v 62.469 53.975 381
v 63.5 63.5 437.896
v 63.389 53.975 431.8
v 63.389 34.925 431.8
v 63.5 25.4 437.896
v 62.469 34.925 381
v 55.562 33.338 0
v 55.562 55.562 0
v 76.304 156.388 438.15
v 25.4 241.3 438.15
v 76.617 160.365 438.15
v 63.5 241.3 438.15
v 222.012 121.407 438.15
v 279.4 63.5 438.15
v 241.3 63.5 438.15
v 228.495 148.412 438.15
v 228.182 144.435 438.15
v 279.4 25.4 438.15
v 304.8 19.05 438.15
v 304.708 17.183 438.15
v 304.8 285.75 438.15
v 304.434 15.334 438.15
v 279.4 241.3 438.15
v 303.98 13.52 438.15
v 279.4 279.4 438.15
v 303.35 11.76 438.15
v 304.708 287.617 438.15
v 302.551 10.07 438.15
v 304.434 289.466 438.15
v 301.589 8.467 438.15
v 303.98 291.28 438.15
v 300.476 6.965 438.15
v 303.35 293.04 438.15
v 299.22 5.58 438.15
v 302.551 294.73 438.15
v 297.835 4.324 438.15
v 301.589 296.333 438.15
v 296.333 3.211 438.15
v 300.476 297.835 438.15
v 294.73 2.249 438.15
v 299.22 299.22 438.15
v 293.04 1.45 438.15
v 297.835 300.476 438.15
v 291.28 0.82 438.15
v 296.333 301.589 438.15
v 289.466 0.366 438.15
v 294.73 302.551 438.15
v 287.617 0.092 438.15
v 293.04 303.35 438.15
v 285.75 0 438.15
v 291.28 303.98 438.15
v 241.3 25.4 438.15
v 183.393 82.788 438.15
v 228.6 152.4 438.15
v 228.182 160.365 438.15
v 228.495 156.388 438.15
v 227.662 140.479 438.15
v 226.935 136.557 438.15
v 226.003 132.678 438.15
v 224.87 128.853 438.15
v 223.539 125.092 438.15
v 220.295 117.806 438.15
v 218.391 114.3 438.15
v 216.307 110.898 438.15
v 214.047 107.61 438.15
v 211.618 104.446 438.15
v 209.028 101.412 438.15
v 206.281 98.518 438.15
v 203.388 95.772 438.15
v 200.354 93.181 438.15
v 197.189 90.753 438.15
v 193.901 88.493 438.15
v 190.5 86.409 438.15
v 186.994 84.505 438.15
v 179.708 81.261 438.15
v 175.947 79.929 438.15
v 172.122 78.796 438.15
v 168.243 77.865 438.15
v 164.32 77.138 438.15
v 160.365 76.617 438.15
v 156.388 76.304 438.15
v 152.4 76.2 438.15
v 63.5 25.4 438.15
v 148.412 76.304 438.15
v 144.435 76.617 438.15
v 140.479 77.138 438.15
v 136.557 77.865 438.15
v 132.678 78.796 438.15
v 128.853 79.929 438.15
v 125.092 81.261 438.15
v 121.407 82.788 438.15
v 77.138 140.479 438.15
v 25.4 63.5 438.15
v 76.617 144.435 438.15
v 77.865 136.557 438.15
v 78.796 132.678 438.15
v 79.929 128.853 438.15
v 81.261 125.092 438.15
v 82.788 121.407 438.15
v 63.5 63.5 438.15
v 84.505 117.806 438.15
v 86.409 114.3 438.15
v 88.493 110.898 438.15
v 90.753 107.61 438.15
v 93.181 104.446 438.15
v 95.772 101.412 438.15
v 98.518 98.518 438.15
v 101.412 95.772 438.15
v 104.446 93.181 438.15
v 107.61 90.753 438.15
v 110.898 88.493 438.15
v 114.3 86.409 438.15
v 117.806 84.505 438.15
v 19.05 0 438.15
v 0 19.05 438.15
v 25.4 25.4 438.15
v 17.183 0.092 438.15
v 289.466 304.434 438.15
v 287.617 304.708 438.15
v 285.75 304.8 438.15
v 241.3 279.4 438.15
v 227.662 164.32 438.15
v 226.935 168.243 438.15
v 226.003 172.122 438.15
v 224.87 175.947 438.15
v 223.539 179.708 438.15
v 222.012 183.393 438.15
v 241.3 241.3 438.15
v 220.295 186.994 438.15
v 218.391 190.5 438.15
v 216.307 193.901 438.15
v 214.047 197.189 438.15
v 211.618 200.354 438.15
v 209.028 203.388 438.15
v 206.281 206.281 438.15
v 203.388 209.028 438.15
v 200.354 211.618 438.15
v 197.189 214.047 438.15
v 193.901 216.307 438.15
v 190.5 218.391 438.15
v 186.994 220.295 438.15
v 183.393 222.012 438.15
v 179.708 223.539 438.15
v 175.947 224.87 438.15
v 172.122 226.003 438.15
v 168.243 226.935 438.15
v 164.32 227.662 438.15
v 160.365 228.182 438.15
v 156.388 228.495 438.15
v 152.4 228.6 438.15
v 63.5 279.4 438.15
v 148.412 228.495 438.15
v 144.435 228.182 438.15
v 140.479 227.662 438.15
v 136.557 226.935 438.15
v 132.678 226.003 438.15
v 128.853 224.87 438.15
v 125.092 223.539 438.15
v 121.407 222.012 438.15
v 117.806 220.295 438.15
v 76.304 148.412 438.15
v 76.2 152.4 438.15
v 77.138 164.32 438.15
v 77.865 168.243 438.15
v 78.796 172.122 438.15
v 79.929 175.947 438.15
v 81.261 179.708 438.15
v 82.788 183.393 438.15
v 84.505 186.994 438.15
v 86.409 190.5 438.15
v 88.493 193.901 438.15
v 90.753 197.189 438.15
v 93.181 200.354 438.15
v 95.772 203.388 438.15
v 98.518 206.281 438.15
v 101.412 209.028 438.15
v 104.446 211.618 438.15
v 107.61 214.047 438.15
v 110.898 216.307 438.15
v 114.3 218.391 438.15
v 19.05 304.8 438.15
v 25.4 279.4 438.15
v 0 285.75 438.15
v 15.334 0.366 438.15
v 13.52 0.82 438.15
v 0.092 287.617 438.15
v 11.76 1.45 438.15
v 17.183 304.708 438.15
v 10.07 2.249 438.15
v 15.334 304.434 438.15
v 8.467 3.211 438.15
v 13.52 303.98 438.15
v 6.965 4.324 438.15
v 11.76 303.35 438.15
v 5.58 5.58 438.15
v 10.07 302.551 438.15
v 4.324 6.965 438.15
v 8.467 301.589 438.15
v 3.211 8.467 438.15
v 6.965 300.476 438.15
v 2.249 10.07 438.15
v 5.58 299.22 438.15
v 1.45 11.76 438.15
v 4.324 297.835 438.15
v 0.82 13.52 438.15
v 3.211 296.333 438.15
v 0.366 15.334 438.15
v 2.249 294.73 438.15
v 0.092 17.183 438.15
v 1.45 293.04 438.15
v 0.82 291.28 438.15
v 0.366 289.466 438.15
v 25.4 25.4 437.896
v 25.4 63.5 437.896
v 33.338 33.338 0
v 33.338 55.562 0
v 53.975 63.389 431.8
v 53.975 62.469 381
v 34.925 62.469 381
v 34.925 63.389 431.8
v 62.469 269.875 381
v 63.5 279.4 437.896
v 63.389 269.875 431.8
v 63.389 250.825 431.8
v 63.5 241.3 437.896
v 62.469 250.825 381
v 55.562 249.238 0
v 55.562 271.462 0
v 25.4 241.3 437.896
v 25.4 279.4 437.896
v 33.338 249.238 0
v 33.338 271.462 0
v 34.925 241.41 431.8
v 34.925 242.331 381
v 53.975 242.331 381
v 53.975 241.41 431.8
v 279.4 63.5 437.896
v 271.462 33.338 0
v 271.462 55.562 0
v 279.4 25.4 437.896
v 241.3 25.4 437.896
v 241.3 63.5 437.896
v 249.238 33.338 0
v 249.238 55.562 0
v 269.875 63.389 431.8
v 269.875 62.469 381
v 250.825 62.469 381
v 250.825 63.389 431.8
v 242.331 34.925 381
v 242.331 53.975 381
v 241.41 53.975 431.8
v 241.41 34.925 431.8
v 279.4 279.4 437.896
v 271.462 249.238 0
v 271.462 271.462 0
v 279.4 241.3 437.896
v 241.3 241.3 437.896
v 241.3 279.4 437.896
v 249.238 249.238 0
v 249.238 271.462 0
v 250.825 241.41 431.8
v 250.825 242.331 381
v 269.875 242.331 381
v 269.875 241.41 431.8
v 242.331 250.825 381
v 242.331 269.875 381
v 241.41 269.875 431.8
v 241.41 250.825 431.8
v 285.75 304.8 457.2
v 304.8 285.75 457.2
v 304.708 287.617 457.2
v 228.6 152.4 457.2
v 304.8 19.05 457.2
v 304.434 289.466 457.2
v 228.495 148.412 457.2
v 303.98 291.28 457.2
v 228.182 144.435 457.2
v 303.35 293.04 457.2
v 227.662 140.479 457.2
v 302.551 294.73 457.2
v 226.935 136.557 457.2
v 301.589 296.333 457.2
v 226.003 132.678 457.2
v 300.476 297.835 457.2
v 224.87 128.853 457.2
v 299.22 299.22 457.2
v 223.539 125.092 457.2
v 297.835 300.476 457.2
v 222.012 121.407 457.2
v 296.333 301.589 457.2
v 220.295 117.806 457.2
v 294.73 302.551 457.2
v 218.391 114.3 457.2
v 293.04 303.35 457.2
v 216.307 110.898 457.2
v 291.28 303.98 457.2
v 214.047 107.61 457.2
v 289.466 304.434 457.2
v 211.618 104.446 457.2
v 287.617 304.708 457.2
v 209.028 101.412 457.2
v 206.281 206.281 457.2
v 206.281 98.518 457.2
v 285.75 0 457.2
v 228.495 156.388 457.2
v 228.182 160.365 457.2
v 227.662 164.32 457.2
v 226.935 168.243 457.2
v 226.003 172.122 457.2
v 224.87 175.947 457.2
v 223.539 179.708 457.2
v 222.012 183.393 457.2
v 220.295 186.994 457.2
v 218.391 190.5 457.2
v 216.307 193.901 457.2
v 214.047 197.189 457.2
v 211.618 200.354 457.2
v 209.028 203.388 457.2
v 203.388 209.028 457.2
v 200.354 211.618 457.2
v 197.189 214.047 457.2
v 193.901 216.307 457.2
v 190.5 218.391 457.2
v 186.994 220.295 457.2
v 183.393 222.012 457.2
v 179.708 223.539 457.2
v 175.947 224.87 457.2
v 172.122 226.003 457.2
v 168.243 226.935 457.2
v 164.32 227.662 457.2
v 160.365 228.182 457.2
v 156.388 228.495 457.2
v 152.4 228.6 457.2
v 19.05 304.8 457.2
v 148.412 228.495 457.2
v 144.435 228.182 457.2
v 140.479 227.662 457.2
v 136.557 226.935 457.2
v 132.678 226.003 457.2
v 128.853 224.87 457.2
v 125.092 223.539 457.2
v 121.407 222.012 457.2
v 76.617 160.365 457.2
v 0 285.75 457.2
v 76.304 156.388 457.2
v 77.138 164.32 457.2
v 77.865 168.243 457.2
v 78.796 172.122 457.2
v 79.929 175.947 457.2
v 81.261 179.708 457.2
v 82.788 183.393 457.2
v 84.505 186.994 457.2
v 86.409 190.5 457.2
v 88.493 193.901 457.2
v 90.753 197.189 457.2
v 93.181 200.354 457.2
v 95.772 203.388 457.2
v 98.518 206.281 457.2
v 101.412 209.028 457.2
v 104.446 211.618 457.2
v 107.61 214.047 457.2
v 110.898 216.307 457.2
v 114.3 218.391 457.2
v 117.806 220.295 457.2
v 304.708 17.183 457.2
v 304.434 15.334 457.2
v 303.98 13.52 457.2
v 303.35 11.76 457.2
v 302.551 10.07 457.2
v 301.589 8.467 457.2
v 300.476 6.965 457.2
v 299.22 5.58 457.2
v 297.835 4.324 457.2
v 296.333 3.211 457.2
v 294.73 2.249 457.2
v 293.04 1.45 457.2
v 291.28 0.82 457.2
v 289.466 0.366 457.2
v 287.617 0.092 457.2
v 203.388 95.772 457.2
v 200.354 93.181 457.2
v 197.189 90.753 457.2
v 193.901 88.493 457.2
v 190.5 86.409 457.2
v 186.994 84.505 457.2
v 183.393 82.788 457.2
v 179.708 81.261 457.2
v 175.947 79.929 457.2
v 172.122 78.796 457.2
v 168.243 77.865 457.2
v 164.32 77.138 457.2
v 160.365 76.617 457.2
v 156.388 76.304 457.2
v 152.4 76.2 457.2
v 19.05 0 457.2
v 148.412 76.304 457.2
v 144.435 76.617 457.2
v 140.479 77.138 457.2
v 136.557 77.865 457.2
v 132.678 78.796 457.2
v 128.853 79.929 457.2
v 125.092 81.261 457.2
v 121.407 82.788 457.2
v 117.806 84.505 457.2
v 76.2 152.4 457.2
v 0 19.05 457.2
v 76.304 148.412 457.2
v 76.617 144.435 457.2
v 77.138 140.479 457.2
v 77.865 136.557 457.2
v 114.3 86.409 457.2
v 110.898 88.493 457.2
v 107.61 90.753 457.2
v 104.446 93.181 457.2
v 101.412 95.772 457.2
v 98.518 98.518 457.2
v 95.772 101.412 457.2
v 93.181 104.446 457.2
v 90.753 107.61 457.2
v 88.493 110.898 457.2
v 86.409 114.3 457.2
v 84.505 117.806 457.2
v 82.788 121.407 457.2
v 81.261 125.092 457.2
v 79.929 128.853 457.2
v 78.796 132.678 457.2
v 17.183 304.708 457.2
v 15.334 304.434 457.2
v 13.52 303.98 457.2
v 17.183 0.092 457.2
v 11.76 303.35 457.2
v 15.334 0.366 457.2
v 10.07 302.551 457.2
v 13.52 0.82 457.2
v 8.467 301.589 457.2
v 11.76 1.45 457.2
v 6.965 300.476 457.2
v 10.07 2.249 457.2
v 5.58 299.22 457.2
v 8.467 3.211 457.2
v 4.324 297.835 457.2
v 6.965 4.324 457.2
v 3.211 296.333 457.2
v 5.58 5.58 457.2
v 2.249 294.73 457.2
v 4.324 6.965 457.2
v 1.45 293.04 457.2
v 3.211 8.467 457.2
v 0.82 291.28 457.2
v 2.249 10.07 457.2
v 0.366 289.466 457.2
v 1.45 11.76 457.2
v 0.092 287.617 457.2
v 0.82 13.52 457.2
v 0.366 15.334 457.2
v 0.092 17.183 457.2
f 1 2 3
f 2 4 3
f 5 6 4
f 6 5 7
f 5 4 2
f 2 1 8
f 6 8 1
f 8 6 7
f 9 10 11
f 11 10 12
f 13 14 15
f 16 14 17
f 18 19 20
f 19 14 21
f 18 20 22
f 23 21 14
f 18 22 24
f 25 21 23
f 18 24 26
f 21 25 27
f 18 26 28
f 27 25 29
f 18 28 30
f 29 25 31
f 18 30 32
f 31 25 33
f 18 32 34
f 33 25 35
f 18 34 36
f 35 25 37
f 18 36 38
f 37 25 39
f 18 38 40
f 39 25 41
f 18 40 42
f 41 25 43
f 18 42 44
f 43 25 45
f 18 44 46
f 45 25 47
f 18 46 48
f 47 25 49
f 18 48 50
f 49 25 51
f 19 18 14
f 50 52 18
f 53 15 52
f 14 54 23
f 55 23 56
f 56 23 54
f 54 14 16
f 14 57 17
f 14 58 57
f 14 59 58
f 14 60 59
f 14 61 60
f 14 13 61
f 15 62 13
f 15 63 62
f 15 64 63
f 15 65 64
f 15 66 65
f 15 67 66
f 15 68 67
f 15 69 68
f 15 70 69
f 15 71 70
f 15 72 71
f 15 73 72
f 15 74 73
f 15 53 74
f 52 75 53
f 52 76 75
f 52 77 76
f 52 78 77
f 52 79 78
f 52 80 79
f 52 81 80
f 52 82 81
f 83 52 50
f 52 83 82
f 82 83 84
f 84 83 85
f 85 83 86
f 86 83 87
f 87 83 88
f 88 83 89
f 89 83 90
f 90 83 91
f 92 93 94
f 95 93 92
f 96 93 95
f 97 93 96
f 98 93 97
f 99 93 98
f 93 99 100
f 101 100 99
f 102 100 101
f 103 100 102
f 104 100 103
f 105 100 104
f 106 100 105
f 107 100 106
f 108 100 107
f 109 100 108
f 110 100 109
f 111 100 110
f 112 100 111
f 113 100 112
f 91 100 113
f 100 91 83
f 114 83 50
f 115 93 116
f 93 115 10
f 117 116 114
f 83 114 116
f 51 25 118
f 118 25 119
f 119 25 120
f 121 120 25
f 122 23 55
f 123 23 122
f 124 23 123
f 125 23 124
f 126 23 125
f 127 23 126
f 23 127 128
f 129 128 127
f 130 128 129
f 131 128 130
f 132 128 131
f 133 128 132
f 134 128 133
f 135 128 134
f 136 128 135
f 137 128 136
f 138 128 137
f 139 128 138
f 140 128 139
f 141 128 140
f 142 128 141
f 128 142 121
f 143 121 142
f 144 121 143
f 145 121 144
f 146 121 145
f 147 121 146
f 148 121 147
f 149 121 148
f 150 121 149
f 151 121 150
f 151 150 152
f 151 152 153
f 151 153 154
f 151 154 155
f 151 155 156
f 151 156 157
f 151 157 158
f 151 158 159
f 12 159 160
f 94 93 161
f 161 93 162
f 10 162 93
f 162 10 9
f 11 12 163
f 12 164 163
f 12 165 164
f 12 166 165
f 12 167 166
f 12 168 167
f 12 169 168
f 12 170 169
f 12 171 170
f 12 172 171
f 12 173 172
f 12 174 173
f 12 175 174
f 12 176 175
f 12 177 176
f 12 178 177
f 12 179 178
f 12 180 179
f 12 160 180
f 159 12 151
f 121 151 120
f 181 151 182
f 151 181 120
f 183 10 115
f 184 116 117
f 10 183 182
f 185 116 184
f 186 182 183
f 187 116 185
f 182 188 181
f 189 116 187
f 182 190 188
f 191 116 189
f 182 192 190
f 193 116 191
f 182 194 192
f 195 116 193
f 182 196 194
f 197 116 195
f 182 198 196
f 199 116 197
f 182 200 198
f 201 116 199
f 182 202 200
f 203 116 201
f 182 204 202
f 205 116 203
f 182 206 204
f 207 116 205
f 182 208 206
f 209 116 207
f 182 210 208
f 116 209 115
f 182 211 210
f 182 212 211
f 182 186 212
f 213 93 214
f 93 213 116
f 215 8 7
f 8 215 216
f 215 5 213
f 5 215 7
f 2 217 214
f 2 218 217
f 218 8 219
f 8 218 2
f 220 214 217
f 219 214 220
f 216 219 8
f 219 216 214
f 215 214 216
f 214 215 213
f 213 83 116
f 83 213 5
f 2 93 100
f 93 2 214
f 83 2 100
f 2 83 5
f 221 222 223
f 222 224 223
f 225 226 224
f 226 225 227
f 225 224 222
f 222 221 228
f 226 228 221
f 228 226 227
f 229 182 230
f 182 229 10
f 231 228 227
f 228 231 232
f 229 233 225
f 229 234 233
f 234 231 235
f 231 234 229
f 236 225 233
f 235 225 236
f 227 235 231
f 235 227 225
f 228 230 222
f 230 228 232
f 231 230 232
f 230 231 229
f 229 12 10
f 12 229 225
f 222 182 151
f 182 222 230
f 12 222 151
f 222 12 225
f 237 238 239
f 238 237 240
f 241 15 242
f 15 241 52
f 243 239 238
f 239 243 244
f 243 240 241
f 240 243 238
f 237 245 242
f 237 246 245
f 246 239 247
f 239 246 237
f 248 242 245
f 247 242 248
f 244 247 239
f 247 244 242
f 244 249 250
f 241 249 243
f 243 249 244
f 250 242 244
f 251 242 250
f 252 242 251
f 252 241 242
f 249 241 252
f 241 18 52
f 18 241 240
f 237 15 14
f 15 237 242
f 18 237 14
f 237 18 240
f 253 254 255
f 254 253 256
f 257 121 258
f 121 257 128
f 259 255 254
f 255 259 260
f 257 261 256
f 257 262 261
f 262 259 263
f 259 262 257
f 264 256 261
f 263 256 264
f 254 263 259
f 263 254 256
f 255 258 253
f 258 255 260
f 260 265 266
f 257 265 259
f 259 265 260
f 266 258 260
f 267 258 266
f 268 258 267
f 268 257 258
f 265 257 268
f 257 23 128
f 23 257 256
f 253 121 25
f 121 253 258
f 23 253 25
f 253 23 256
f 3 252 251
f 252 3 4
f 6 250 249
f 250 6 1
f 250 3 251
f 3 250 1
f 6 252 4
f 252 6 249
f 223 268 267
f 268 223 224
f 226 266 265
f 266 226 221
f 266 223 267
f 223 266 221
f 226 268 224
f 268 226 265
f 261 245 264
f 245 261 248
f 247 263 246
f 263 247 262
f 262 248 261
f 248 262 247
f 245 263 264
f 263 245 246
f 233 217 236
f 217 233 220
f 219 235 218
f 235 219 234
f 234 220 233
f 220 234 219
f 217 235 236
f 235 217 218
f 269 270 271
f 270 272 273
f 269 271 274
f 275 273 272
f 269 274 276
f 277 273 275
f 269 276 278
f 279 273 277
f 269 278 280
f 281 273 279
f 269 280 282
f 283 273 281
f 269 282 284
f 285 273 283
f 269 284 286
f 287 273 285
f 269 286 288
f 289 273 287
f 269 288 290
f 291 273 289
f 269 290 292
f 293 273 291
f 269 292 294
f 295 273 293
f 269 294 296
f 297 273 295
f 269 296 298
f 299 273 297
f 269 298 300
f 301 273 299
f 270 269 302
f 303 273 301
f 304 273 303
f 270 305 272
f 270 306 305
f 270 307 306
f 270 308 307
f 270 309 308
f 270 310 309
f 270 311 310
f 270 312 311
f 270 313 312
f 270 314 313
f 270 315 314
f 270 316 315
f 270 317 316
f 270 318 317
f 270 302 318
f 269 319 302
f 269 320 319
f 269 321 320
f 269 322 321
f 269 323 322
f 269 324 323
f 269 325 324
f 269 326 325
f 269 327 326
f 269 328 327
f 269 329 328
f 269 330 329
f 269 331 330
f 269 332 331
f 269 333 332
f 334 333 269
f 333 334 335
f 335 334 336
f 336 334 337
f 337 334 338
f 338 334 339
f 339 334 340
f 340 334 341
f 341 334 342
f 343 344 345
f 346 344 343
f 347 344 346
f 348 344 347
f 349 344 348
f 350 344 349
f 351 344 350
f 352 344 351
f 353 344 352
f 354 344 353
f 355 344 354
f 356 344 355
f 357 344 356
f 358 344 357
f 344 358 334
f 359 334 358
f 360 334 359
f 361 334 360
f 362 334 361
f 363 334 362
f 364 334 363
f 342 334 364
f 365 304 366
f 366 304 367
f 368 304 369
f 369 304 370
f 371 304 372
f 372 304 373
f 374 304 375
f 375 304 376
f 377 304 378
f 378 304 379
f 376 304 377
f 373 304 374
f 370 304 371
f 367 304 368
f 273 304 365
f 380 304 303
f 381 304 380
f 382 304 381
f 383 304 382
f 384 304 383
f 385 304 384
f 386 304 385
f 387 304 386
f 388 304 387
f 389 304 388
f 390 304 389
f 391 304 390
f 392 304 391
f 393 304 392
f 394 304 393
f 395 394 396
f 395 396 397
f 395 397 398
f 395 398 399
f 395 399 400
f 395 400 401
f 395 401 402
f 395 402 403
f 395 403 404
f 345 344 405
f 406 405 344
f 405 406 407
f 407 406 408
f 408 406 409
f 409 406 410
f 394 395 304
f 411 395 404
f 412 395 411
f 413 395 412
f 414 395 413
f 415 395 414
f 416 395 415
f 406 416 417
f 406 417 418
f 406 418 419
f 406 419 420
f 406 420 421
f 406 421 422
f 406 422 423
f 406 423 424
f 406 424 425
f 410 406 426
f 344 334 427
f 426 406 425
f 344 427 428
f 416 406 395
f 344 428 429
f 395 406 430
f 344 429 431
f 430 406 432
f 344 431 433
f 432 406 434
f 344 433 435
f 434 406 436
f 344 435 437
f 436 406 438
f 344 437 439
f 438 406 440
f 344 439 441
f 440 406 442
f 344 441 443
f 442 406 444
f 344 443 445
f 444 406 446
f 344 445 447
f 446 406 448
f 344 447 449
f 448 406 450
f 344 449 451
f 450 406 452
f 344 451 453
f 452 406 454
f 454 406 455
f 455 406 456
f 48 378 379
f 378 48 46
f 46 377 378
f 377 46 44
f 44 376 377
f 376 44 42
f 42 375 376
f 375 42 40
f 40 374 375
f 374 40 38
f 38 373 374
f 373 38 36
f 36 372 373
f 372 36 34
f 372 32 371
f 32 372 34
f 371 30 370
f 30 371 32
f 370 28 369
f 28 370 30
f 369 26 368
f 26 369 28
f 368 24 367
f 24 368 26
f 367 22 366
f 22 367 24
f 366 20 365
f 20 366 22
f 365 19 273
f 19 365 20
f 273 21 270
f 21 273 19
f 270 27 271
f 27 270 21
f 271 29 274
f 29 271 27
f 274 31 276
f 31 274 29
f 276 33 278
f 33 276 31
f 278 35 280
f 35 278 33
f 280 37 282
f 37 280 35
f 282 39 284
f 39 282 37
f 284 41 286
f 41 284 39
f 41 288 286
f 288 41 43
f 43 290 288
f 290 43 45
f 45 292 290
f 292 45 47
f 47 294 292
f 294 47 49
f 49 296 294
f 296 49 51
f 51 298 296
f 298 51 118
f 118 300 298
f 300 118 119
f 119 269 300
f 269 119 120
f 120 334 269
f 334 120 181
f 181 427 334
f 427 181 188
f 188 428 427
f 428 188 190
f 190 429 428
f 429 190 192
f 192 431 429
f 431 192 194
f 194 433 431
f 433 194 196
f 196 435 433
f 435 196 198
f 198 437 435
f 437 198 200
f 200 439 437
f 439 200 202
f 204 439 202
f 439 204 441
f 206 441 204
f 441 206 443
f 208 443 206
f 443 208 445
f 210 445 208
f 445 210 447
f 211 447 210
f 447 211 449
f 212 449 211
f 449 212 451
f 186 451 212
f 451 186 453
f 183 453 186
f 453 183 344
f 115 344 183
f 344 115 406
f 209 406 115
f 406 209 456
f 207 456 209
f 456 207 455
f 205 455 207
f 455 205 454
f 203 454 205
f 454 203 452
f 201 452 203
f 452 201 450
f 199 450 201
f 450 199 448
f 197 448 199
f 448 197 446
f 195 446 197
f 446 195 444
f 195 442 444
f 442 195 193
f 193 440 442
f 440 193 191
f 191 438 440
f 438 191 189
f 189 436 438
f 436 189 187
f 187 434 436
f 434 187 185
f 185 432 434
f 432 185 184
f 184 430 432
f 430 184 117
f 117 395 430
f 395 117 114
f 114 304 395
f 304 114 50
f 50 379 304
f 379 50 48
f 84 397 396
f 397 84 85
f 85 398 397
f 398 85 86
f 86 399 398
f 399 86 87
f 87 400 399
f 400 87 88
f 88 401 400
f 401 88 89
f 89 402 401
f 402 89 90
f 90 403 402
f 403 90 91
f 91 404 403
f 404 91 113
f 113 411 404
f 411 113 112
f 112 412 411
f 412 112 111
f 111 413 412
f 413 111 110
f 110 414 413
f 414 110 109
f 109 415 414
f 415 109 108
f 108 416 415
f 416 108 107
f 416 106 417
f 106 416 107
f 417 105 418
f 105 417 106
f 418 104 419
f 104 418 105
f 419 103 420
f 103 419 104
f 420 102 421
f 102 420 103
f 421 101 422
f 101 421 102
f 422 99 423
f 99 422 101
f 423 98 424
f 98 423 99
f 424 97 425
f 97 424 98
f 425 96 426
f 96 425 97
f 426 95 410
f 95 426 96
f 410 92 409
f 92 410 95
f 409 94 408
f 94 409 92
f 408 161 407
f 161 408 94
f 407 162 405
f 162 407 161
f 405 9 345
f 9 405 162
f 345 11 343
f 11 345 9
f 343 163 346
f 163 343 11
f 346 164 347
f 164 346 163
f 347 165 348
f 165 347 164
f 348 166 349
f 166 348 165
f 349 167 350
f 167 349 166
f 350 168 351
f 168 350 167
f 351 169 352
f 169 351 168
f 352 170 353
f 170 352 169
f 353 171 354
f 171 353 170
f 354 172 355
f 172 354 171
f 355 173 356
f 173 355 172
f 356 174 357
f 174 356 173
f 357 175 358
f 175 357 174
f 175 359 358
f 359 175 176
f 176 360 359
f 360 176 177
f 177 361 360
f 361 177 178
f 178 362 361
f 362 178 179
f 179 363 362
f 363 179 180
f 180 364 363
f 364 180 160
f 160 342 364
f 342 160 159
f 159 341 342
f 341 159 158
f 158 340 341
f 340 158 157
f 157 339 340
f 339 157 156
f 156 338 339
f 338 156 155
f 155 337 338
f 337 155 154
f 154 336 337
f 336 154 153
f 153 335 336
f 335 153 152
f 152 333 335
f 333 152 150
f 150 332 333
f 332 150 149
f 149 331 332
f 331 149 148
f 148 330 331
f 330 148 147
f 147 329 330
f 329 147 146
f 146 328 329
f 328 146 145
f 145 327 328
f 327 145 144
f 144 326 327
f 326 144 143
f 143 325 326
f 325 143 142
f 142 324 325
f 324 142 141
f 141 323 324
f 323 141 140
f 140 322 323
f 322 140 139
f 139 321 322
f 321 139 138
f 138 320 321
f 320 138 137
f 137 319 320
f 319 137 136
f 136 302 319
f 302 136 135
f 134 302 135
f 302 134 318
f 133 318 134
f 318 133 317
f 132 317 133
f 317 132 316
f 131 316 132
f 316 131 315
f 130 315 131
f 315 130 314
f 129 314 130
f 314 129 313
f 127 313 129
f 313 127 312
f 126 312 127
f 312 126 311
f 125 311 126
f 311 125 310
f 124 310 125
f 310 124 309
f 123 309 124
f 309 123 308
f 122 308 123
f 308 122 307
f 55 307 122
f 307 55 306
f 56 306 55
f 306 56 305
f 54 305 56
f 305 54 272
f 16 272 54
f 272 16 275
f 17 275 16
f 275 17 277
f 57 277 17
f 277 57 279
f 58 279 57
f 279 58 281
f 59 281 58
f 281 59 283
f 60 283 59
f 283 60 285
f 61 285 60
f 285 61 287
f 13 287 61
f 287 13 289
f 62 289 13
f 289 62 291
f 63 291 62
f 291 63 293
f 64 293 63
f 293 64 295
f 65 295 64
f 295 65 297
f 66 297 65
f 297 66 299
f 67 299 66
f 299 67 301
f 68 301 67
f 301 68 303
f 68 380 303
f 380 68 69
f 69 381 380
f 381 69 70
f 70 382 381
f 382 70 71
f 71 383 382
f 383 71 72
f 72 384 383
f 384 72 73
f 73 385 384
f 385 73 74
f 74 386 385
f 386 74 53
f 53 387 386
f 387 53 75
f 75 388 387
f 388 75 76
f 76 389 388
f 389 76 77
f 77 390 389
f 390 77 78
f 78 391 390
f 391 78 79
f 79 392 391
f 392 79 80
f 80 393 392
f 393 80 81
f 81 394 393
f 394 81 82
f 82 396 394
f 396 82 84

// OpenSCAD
// =============================================================
//  Plant stands -- ring top, two designs
//
//  STAND = "four"  square top, four tapered legs, aprons.  No angled joinery
//                  anywhere: the legs stand plumb and the taper does the work.
//
//  STAND = "three" round top, three legs splayed outward.  Harder, and the
//                  reason it is possible at all is the compound mitre saw --
//                  set bevel AND mitre, cut the leg's top once, and it mates
//                  flat against a horizontal underside.  That is the whole
//                  trick; without it, splayed square legs need hand-cut
//                  compound angles.
//
//  The pot NESTS in the opening and hangs by its rim, so the stand carries the
//  pot's weight in shear at the ring rather than in bending across a top.
//  Which means the ring can be thin and still strong.
//
//      openscad plant_stand.scad
//      openscad -D 'STAND="three"' -D HEIGHT=14 plant_stand.scad
// =============================================================
UNIT = 25.4;

STAND = "four";      // four | three
mode  = "assembled"; // assembled | exploded | parts | none

// ---------------- stock
T = 0.75;

// ---------------- overall
HEIGHT = 18.00;      // floor to the top surface
POT_D  = 6.00;       // the opening.  A 6" nursery pot has a ~6-1/2" rim, so
                     // it drops in and hangs -- measure YOUR pots, this is the
                     // one dimension the whole thing is built around.
TOP_W  = 12.00;      // square side (four) or diameter (three)
TOP_R  = 0.75;       // corner radius on the square top

// ---------------- legs
LEG_TOP = 1.50;      // square at the top
LEG_BOT = 0.875;     // at the foot -- tapered on all four faces
LEG_IN  = 1.00;      // outer face, in from the edge of the top

// ---------------- four-leg version
APRON_H   = 2.00;    // apron depth
APRON_T   = T;
APRON_REC = 0.375;   // apron face set back from the leg's outer face
APRON_DAD = 0.25;    // housed this deep into the leg

// ---------------- three-leg version
SPLAY  = 9;          // degrees the legs lean out
LEG_R  = 3.60;       // radius to the leg centre at the top
BLOCK  = 1.00;       // glue block in the inner corner
BLOCK_H = 1.25;

EPS = 0.01;

WOOD  = "#7a4f2e";
WOOD2 = "#8a5c38";

// =============================================================
//  shared
// =============================================================
module ring_2d() {
    difference() {
        if (STAND == "three") circle(d = TOP_W, $fn = 160);
        else translate([TOP_R, TOP_R])
                offset(r = TOP_R, $fn = 64) square(TOP_W - 2*TOP_R);
        translate(STAND == "three" ? [0, 0] : [TOP_W/2, TOP_W/2])
            circle(d = POT_D, $fn = 120);
    }
}

module top_ring() {
    translate([0, 0, HEIGHT - T]) linear_extrude(T) ring_2d();
}

// A leg standing on the origin, big end up, tapering to the foot.
module leg(h) {
    hull() {
        translate([-LEG_TOP/2, -LEG_TOP/2, h - EPS]) cube([LEG_TOP, LEG_TOP, EPS]);
        translate([-LEG_BOT/2, -LEG_BOT/2, 0])       cube([LEG_BOT, LEG_BOT, EPS]);
    }
}

// =============================================================
//  four: square top, plumb tapered legs, housed aprons
// =============================================================
LEG_C = LEG_IN + LEG_TOP/2;              // leg centre, in from the top's edge
SPAN  = TOP_W - 2*LEG_C;                 // centre to centre

module four_legs() {
    for (sx = [0, 1], sy = [0, 1])
        translate([LEG_C + sx*SPAN, LEG_C + sy*SPAN, 0])
            leg(HEIGHT - T);
}

// One apron, running in x, at y.  Housed into the legs at each end.
module apron_x(y) {
    x0 = LEG_C - LEG_TOP/2 + LEG_TOP - APRON_DAD;
    x1 = LEG_C + SPAN + LEG_TOP/2 - LEG_TOP + APRON_DAD;
    translate([x0, y - APRON_T/2, HEIGHT - T - APRON_H - 0.25])
        cube([x1 - x0, APRON_T, APRON_H]);
}

module four_aprons() {
    yin = LEG_C - LEG_TOP/2 + APRON_REC + APRON_T/2;
    for (y = [yin, TOP_W - yin]) apron_x(y);
    for (x = [yin, TOP_W - yin])
        translate([x, 0, 0]) rotate([0, 0, 90]) translate([0, -TOP_W, 0])
            apron_x(TOP_W - x < 0 ? 0 : 0);
}

// simpler: build the two y-running aprons by rotating the whole x pair
module four_aprons_all() {
    yin = LEG_C - LEG_TOP/2 + APRON_REC + APRON_T/2;
    for (y = [yin, TOP_W - yin]) apron_x(y);
    translate([TOP_W, 0, 0]) rotate([0, 0, 90])
        for (y = [yin, TOP_W - yin]) apron_x(y);
}

module stand_four(explode = 0) {
    color(WOOD)  translate([0, 0, explode*3]) top_ring();
    color(WOOD2) four_legs();
    color(WOOD)  translate([0, 0, explode*1.4]) four_aprons_all();
}

// =============================================================
//  three: round top, splayed legs, glue blocks
// =============================================================
module three_legs() {
    for (a = [0 : 120 : 359])
        rotate([0, 0, a])
            translate([LEG_R, 0, HEIGHT - T])
                rotate([0, -SPLAY, 0])   // negative: foot moves OUTWARD
                    translate([0, 0, -(HEIGHT - T)])
                        leg(HEIGHT - T);
}

// blocks in the inner corner, the same trick the scandinavian wine rack uses
module three_blocks() {
    for (a = [0 : 120 : 359])
        rotate([0, 0, a])
            translate([LEG_R - LEG_TOP/2 - BLOCK, -BLOCK/2, HEIGHT - T - BLOCK_H])
                cube([BLOCK, BLOCK, BLOCK_H]);
}

module stand_three(explode = 0) {
    color(WOOD)  translate([0, 0, explode*3]) top_ring();
    color(WOOD2) three_legs();
    color(WOOD)  three_blocks();
}

// =============================================================
scale(UNIT) {
    if (mode == "assembled") {
        if (STAND == "three") stand_three(0); else stand_four(0);
    } else if (mode == "exploded") {
        if (STAND == "three") stand_three(1); else stand_four(1);
    } else if (mode == "parts") {
        color(WOOD) linear_extrude(T) ring_2d();
        color(WOOD2) translate([TOP_W + 3, 0, 0]) leg(HEIGHT - T);
    }
}

echo(str("stand               = ", STAND));
echo(str("height              = ", HEIGHT, " to the top surface"));
echo(str("top                 = ", TOP_W,
         STAND == "three" ? " dia" : " square", " x ", T));
echo(str("opening             = ", POT_D, "  -> takes a pot with a rim wider than this"));
echo(str("ring width          = ", (TOP_W - POT_D)/2, " all round"));
echo(str("leg                 = ", LEG_TOP, " sq tapering to ", LEG_BOT));
if (STAND == "four")
    echo(str("apron               = ", APRON_H, " deep, housed ", APRON_DAD,
             " into the legs"));
else
    echo(str("splay               = ", SPLAY, " deg  -> feet spread ",
             2*(LEG_R + (HEIGHT-T)*tan(SPLAY)), " across"));
